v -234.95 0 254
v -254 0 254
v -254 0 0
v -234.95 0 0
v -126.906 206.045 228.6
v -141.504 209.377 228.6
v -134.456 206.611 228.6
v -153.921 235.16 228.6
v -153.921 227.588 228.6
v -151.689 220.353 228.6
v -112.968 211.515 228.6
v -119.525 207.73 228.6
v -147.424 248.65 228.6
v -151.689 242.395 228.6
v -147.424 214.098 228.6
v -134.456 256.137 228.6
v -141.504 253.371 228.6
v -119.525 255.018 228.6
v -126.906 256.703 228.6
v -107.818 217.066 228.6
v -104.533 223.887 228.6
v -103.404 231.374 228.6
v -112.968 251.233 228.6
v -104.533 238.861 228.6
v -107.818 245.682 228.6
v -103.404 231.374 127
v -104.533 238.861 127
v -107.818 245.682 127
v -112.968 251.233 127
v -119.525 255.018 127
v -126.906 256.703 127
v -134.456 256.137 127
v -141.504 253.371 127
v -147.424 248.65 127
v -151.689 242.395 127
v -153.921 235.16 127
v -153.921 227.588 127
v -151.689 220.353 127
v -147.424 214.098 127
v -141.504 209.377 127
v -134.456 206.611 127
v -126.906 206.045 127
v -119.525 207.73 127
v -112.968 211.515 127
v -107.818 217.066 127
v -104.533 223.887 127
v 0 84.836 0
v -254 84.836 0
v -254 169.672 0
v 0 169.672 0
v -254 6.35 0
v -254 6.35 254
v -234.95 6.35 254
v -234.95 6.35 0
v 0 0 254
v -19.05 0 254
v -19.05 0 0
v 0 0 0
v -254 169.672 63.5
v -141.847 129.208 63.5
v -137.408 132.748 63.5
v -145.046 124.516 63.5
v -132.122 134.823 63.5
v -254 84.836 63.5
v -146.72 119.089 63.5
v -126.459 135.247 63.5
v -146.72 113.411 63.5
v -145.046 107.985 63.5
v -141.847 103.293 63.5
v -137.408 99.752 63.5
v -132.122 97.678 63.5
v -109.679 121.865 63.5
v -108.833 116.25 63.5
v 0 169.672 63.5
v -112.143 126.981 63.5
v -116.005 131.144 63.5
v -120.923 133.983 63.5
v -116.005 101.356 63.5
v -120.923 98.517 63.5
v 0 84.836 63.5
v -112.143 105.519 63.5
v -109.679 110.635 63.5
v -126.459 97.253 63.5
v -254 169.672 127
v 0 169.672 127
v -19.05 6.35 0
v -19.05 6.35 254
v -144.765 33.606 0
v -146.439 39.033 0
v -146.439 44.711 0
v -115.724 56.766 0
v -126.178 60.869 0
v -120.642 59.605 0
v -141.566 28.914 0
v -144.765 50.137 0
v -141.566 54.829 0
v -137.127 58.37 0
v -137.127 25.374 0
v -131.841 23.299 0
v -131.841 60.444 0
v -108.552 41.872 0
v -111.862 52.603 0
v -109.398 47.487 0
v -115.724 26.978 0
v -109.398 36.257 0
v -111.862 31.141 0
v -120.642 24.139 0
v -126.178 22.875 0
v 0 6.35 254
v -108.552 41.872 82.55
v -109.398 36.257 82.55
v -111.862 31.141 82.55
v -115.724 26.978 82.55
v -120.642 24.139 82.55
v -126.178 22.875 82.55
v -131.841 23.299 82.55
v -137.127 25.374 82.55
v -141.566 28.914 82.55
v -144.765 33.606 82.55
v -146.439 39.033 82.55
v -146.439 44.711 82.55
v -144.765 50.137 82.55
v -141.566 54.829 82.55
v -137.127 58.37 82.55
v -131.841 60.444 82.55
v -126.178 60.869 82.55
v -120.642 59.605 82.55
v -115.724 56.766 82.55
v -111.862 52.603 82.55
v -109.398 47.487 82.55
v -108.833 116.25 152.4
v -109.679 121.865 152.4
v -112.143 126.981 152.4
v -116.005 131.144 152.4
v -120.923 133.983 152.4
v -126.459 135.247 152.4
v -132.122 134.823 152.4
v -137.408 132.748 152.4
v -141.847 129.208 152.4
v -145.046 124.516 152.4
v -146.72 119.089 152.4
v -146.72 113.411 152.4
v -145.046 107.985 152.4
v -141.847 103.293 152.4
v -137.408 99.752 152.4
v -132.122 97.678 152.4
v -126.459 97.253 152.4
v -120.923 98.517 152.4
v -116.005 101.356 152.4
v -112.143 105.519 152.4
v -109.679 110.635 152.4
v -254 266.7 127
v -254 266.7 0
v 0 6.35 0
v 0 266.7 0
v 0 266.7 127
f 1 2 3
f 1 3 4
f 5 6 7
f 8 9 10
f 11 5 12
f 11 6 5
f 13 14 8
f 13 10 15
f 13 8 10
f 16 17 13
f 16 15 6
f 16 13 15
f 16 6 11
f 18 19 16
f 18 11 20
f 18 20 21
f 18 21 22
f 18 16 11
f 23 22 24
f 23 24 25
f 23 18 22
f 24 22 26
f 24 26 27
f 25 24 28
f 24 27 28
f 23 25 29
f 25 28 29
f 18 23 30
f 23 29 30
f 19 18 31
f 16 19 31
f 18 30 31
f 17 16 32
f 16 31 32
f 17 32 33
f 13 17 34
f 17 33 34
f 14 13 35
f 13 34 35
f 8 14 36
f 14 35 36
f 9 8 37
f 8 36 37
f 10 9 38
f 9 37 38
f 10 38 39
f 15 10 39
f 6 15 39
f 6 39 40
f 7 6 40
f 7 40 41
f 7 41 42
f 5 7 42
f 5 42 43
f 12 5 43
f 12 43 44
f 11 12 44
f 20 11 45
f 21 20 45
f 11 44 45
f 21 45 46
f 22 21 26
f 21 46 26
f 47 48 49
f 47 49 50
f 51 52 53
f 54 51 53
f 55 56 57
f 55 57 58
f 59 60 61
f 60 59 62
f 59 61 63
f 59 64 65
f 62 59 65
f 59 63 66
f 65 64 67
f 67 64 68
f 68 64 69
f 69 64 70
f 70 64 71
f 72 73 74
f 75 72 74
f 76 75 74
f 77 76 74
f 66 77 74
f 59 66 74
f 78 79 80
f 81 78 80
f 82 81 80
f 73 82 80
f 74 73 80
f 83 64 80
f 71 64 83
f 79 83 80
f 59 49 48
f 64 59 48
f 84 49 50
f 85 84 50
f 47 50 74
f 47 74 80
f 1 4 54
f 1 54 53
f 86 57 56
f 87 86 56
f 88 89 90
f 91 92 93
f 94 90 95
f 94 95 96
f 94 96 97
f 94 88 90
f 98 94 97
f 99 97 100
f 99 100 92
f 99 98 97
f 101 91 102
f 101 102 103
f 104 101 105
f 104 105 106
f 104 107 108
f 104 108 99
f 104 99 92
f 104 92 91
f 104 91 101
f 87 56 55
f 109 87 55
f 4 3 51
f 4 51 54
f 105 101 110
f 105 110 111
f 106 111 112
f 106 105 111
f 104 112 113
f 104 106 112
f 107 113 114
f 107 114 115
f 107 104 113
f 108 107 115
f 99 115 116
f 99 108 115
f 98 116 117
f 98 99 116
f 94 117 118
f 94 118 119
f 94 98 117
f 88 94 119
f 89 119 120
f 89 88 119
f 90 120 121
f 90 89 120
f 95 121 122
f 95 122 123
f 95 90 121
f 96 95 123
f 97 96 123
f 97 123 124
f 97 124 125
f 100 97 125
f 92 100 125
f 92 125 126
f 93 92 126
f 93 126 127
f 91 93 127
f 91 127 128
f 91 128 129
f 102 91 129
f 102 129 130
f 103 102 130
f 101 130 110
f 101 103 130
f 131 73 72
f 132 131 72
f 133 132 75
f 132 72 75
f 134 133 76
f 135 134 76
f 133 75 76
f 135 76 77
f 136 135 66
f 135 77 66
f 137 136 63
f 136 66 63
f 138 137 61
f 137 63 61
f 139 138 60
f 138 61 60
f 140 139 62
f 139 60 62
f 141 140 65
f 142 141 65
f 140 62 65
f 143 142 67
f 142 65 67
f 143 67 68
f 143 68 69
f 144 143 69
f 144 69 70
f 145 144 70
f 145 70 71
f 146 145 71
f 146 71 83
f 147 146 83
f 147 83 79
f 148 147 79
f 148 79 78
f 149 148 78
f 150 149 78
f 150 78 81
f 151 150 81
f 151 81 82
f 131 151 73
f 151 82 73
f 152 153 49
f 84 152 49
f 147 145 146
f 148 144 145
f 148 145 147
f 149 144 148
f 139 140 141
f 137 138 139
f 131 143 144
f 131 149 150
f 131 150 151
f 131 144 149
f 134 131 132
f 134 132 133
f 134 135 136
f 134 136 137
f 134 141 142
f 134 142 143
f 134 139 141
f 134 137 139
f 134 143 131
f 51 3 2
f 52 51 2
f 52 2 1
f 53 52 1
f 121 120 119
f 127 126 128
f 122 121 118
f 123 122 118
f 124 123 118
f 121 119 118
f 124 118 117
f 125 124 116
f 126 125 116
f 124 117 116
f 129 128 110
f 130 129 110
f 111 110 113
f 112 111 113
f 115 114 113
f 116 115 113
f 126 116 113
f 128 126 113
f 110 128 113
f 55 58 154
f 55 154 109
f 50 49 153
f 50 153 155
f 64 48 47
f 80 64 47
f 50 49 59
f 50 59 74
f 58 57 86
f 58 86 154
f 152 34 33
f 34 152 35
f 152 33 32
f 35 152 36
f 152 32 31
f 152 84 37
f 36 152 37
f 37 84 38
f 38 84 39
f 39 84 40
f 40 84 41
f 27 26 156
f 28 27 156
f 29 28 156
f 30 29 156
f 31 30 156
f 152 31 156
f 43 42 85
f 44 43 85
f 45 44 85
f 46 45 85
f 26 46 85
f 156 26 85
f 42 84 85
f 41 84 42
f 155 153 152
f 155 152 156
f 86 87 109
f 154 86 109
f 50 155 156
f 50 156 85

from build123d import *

# Parameters (mm, degrees)
F5_W      = 19.05
F5_H      = 254
F6_DEPTH  = 6.35
F7_W      = 254
F7_H      = 84.836
F8_DEPTH  = 63.5
F7_H_2    = 97.028
F9_DEPTH  = 127
F10_R     = 19.05
F11_DEPTH = 82.55
F12_R     = 19.05
F13_DEPTH = 88.9
F14_R     = 25.4
F15_DEPTH = 101.6


# Not quite as in the source:
# - the program builds the solid bodies; features that only make, move or delete a surface that nothing else refers to are left out


with BuildPart() as f6:
    # F5 (on Front) → F6 (new body)
    with BuildSketch(Plane.XZ):
        with Locations((-244.475, 127)):
            Rectangle(F5_W, F5_H)
    extrude(amount=-F6_DEPTH)


with BuildPart() as f6b:
    # F5 (on Front) → F6, piece 2 (new body)
    with BuildSketch(Plane.XZ):
        with Locations((-9.525, 127)):
            Rectangle(F5_W, F5_H)
    extrude(amount=-F6_DEPTH)


with BuildPart() as f8:
    # F7 (on face) → F8 (new body)
    with BuildSketch(Plane(origin=(0, 0, 0), x_dir=(1, 0, 0), z_dir=(0, 0, -1))):
        with Locations((-127, -127.254)):
            Rectangle(F7_W, F7_H)
    extrude(amount=-F8_DEPTH)

    # F12 (on face) → F13 (join)
    with BuildSketch(Plane.XY.offset(63.5)):
        with Locations((-127.8826892376, 116.2502095103)):
            Circle(F12_R)
    extrude(amount=F13_DEPTH)


with BuildPart() as f9:
    # F7 (on face) → F9 (new body)
    with BuildSketch(Plane(origin=(0, 0, 0), x_dir=(1, 0, 0), z_dir=(0, 0, -1))):
        with Locations((-127, -218.186)):
            Rectangle(F7_W, F7_H_2)
    extrude(amount=-F9_DEPTH)

    # F14 (on face) → F15 (join)
    with BuildSketch(Plane.XY.offset(127)):
        with Locations((-128.804281354, 231.3739955425)):
            Circle(F14_R)
    extrude(amount=F15_DEPTH)


with BuildPart() as f11:
    # F10 (on face) → F11 (new body)
    with BuildSketch(Plane(origin=(0, 0, 0), x_dir=(1, 0, 0), z_dir=(0, 0, -1))):
        with Locations((-127.6017278433, -41.8717749417)):
            Circle(F10_R)
    extrude(amount=-F11_DEPTH)


solid = Compound([f6.part, f6b.part, f8.part, f9.part, f11.part])
